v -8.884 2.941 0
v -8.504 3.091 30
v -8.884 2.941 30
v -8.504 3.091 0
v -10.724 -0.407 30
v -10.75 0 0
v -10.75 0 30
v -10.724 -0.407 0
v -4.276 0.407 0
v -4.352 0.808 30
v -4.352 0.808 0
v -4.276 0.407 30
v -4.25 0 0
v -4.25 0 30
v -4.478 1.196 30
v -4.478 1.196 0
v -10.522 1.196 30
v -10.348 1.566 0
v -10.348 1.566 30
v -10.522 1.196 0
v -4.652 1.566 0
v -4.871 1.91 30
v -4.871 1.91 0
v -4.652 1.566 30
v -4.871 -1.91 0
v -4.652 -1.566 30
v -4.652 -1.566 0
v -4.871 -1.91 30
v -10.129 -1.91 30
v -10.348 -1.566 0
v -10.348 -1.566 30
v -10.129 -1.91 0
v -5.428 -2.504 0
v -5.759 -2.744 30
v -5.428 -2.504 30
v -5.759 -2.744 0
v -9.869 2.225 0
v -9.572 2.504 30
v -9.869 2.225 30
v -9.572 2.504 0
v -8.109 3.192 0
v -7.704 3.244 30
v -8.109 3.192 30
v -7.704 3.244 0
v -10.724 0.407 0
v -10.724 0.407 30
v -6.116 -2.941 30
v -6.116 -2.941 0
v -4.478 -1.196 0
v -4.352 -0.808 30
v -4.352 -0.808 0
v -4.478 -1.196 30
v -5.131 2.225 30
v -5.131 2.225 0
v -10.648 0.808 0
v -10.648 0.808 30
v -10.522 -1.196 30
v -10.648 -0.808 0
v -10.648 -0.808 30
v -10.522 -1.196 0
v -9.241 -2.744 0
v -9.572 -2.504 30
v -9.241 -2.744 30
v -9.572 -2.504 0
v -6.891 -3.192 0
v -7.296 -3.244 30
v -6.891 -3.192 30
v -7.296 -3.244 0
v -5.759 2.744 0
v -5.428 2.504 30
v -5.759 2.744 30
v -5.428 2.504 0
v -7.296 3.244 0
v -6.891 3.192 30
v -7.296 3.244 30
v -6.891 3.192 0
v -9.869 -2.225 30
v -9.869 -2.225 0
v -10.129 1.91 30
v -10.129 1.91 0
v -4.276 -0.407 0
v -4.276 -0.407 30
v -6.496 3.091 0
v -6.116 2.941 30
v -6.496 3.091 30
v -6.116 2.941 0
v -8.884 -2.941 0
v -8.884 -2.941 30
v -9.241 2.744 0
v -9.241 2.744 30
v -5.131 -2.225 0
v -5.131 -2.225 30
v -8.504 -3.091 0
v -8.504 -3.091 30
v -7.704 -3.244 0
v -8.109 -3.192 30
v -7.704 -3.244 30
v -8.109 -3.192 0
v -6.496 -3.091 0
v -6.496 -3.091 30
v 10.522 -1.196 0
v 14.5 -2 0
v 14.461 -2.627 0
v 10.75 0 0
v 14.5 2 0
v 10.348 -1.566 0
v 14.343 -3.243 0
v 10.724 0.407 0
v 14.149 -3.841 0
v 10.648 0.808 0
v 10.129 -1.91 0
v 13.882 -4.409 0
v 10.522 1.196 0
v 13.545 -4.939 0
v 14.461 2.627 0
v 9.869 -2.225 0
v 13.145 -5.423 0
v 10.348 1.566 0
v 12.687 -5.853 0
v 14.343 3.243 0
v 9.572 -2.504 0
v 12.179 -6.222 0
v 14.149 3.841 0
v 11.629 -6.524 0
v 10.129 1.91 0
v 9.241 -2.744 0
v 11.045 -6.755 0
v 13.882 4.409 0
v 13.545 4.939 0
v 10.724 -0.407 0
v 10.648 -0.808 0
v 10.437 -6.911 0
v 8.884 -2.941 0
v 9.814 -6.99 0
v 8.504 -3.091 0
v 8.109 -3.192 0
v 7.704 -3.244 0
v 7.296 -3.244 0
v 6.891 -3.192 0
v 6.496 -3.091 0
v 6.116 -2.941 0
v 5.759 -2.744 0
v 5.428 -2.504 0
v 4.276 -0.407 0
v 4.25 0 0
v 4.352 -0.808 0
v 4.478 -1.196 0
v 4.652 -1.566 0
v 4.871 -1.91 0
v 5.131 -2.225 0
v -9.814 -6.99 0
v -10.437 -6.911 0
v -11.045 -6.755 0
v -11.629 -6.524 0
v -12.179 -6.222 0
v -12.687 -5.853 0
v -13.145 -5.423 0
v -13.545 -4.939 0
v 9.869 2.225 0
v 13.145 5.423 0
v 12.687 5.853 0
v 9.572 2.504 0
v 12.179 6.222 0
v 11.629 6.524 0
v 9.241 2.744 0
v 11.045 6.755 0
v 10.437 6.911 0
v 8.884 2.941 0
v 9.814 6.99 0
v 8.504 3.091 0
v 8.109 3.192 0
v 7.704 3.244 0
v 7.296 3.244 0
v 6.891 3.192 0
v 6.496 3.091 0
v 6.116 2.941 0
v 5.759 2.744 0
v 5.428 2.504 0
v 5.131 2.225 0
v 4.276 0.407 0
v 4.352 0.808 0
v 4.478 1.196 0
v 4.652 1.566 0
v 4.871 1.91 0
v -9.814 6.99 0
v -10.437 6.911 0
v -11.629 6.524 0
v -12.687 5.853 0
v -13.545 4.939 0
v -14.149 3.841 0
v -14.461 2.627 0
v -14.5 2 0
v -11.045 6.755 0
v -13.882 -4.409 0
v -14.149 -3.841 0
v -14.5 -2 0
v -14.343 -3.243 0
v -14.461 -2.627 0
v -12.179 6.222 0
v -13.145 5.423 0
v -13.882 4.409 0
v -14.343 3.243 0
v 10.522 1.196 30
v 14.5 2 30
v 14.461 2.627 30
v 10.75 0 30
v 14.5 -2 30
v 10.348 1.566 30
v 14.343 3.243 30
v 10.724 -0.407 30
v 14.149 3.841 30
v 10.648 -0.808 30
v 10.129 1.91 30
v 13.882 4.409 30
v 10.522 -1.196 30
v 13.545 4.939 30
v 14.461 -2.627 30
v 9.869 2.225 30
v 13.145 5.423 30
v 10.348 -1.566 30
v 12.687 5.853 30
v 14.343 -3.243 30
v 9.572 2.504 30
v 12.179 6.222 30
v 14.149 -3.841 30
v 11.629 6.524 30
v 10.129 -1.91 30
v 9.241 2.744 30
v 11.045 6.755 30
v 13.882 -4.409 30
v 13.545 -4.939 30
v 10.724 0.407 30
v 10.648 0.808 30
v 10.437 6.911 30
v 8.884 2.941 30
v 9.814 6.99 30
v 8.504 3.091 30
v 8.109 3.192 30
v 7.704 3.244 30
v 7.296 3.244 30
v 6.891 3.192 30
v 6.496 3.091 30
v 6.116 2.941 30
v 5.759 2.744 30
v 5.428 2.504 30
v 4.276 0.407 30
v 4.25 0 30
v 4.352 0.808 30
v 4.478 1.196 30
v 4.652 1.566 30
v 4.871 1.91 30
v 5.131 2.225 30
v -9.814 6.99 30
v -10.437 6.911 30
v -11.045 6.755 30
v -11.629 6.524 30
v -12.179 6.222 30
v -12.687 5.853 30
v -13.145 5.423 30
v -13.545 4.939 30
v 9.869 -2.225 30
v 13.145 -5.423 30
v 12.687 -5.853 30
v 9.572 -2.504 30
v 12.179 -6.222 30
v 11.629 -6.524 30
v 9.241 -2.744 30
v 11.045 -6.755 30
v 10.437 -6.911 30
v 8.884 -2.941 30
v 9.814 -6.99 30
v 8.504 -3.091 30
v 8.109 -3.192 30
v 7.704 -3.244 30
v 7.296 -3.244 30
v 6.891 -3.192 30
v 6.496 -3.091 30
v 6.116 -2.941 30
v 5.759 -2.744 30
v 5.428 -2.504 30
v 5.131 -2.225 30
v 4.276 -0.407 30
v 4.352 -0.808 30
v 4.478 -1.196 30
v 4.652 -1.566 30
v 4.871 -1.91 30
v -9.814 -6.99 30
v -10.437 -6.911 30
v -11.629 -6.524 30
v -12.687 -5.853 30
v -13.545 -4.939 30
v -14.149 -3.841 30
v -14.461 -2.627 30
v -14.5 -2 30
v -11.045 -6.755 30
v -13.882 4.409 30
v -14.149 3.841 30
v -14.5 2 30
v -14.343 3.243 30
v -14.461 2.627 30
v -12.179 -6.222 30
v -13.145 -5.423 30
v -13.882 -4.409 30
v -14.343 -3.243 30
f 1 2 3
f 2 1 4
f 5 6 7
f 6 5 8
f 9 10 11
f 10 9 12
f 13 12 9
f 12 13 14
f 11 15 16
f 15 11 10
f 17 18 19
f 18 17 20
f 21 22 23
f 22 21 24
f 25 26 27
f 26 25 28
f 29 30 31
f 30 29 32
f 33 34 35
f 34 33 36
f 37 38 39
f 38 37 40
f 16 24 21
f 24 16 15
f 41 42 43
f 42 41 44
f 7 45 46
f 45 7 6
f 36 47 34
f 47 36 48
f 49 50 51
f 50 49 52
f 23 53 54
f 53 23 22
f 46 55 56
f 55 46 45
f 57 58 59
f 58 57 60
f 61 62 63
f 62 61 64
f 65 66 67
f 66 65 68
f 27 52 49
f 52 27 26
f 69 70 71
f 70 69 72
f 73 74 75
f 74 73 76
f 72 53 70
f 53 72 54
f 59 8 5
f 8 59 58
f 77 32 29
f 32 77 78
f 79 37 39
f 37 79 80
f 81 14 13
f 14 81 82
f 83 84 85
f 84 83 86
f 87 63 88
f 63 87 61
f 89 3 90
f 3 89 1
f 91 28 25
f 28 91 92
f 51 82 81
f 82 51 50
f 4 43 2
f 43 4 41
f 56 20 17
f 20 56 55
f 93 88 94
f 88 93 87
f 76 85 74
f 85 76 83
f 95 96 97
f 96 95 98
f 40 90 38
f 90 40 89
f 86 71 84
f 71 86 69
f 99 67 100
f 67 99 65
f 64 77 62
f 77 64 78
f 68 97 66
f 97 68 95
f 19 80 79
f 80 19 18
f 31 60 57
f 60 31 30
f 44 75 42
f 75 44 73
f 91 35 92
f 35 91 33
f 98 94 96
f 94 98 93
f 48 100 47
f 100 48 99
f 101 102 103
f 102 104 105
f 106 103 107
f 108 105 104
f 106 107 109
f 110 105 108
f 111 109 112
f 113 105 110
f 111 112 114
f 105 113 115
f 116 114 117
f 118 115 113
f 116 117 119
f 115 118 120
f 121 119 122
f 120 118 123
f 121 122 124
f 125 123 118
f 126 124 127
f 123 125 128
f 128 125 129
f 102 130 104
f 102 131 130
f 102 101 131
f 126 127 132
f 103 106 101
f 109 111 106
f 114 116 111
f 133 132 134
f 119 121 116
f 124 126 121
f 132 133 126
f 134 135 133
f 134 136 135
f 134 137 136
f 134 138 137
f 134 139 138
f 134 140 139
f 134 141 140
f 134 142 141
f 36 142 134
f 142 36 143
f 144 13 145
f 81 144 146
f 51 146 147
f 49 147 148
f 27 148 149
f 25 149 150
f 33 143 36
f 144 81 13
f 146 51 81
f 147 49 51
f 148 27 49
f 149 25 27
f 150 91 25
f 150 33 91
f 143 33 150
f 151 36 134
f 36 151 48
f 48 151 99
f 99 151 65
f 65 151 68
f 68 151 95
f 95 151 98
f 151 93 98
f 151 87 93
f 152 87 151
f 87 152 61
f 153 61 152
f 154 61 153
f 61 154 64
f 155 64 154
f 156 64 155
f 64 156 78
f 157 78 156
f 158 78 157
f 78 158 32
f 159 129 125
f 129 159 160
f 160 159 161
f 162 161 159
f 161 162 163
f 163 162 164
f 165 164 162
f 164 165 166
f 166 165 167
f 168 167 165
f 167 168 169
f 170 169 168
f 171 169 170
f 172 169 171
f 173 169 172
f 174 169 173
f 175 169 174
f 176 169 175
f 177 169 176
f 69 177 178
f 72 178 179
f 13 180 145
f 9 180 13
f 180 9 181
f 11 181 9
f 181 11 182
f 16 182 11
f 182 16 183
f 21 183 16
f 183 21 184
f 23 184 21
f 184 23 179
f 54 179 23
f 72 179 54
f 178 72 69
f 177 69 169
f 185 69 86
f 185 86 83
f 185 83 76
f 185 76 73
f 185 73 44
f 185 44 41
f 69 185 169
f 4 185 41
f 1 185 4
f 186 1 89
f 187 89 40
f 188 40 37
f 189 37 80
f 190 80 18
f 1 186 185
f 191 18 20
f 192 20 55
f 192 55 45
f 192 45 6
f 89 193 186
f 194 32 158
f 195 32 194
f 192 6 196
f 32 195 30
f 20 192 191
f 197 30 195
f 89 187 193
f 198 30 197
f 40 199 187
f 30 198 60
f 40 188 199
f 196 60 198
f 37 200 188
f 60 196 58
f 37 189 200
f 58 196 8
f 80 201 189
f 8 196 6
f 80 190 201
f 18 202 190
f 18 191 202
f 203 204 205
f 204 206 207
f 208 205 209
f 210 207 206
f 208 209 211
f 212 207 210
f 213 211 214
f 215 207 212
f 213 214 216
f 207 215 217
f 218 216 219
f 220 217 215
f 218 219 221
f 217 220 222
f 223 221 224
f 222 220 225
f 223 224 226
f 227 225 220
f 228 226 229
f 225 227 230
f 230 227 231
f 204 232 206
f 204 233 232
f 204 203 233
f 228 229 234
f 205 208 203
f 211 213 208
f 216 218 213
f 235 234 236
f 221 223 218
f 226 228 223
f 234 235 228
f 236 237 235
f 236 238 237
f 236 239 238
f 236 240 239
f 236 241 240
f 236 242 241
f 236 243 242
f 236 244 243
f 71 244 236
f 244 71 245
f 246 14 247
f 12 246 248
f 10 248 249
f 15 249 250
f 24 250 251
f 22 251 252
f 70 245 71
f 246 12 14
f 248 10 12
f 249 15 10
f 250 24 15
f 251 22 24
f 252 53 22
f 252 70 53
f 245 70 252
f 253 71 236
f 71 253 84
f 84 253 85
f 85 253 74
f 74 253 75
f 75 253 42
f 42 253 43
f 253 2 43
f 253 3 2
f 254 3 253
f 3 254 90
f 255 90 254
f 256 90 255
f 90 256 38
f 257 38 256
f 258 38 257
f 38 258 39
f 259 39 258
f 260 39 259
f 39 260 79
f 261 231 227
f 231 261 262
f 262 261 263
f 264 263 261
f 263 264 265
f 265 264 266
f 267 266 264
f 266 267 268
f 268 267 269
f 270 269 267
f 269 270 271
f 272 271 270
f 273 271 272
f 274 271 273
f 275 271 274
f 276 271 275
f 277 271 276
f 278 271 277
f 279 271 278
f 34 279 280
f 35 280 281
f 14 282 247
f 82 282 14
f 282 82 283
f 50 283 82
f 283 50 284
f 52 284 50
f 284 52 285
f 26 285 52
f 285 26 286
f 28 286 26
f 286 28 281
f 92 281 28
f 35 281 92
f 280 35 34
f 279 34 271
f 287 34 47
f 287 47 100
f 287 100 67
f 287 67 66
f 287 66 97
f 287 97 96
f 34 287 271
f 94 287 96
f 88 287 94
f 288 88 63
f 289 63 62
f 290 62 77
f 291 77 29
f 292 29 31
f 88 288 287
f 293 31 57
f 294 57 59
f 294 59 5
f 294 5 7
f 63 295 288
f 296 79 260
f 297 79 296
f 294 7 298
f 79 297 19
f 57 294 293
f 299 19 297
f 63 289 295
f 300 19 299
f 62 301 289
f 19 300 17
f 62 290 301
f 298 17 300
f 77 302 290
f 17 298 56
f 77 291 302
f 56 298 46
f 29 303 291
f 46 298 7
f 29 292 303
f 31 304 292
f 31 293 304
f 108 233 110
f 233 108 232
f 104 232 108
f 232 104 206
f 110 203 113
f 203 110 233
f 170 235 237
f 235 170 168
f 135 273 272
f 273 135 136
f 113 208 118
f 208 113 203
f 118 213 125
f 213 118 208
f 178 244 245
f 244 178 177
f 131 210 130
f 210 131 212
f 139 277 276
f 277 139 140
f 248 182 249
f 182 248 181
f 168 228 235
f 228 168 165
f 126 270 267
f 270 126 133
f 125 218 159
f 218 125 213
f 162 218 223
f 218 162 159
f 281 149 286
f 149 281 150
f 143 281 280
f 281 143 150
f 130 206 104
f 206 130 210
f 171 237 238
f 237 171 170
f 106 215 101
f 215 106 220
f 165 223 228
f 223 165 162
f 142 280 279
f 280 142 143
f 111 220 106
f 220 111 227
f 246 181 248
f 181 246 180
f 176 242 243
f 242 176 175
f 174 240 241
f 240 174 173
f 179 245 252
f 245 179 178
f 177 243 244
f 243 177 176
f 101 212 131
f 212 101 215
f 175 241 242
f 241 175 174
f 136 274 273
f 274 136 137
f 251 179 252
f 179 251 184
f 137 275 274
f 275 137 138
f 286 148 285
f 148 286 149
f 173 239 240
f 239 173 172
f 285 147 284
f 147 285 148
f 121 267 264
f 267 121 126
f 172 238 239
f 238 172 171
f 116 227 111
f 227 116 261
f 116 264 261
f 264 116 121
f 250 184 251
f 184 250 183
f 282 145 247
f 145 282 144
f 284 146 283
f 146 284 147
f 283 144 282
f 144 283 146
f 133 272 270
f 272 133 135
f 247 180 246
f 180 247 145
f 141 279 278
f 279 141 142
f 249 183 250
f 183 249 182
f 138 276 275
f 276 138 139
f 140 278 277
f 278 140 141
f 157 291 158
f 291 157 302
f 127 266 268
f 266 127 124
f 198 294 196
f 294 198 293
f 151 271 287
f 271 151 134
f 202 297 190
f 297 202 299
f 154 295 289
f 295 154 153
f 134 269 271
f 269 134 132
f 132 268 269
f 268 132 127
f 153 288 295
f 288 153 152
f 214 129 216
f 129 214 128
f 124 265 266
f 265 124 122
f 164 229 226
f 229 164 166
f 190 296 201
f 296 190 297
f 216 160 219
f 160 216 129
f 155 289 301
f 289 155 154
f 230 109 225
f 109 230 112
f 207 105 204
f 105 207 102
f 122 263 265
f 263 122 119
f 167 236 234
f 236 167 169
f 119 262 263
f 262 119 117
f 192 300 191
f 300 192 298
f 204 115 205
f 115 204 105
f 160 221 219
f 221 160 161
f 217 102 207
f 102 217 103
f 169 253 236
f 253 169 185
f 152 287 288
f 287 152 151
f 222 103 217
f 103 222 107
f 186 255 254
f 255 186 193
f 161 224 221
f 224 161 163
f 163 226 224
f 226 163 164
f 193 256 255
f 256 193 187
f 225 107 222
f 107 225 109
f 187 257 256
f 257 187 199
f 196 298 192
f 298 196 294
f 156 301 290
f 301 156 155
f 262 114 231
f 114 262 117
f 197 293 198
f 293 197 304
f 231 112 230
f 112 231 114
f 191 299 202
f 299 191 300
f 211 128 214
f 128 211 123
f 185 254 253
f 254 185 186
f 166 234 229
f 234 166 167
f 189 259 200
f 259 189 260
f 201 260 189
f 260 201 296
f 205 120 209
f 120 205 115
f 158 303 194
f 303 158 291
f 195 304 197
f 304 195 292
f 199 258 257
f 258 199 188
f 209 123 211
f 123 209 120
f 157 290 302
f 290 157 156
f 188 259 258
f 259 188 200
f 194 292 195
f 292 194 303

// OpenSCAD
$fn = 50;


difference() {
	union() {
		hull() {
			translate(v = [-9.5000000000, 2.0000000000, 0]) {
				cylinder(h = 30, r = 5);
			}
			translate(v = [9.5000000000, 2.0000000000, 0]) {
				cylinder(h = 30, r = 5);
			}
			translate(v = [-9.5000000000, -2.0000000000, 0]) {
				cylinder(h = 30, r = 5);
			}
			translate(v = [9.5000000000, -2.0000000000, 0]) {
				cylinder(h = 30, r = 5);
			}
		}
	}
	union() {
		translate(v = [-7.5000000000, 0.0000000000, 0]) {
			cylinder(h = 30, r = 3.2500000000);
		}
		translate(v = [7.5000000000, 0.0000000000, 0]) {
			cylinder(h = 30, r = 3.2500000000);
		}
		translate(v = [-7.5000000000, 0.0000000000, 0]) {
			cylinder(h = 30, r = 1.8000000000);
		}
		translate(v = [7.5000000000, 0.0000000000, 0]) {
			cylinder(h = 30, r = 1.8000000000);
		}
		translate(v = [-7.5000000000, 0.0000000000, 0]) {
			cylinder(h = 30, r = 1.8000000000);
		}
		translate(v = [7.5000000000, 0.0000000000, 0]) {
			cylinder(h = 30, r = 1.8000000000);
		}
		translate(v = [-7.5000000000, 0.0000000000, 0]) {
			cylinder(h = 30, r = 1.8000000000);
		}
		translate(v = [7.5000000000, 0.0000000000, 0]) {
			cylinder(h = 30, r = 1.8000000000);
		}
	}
}
